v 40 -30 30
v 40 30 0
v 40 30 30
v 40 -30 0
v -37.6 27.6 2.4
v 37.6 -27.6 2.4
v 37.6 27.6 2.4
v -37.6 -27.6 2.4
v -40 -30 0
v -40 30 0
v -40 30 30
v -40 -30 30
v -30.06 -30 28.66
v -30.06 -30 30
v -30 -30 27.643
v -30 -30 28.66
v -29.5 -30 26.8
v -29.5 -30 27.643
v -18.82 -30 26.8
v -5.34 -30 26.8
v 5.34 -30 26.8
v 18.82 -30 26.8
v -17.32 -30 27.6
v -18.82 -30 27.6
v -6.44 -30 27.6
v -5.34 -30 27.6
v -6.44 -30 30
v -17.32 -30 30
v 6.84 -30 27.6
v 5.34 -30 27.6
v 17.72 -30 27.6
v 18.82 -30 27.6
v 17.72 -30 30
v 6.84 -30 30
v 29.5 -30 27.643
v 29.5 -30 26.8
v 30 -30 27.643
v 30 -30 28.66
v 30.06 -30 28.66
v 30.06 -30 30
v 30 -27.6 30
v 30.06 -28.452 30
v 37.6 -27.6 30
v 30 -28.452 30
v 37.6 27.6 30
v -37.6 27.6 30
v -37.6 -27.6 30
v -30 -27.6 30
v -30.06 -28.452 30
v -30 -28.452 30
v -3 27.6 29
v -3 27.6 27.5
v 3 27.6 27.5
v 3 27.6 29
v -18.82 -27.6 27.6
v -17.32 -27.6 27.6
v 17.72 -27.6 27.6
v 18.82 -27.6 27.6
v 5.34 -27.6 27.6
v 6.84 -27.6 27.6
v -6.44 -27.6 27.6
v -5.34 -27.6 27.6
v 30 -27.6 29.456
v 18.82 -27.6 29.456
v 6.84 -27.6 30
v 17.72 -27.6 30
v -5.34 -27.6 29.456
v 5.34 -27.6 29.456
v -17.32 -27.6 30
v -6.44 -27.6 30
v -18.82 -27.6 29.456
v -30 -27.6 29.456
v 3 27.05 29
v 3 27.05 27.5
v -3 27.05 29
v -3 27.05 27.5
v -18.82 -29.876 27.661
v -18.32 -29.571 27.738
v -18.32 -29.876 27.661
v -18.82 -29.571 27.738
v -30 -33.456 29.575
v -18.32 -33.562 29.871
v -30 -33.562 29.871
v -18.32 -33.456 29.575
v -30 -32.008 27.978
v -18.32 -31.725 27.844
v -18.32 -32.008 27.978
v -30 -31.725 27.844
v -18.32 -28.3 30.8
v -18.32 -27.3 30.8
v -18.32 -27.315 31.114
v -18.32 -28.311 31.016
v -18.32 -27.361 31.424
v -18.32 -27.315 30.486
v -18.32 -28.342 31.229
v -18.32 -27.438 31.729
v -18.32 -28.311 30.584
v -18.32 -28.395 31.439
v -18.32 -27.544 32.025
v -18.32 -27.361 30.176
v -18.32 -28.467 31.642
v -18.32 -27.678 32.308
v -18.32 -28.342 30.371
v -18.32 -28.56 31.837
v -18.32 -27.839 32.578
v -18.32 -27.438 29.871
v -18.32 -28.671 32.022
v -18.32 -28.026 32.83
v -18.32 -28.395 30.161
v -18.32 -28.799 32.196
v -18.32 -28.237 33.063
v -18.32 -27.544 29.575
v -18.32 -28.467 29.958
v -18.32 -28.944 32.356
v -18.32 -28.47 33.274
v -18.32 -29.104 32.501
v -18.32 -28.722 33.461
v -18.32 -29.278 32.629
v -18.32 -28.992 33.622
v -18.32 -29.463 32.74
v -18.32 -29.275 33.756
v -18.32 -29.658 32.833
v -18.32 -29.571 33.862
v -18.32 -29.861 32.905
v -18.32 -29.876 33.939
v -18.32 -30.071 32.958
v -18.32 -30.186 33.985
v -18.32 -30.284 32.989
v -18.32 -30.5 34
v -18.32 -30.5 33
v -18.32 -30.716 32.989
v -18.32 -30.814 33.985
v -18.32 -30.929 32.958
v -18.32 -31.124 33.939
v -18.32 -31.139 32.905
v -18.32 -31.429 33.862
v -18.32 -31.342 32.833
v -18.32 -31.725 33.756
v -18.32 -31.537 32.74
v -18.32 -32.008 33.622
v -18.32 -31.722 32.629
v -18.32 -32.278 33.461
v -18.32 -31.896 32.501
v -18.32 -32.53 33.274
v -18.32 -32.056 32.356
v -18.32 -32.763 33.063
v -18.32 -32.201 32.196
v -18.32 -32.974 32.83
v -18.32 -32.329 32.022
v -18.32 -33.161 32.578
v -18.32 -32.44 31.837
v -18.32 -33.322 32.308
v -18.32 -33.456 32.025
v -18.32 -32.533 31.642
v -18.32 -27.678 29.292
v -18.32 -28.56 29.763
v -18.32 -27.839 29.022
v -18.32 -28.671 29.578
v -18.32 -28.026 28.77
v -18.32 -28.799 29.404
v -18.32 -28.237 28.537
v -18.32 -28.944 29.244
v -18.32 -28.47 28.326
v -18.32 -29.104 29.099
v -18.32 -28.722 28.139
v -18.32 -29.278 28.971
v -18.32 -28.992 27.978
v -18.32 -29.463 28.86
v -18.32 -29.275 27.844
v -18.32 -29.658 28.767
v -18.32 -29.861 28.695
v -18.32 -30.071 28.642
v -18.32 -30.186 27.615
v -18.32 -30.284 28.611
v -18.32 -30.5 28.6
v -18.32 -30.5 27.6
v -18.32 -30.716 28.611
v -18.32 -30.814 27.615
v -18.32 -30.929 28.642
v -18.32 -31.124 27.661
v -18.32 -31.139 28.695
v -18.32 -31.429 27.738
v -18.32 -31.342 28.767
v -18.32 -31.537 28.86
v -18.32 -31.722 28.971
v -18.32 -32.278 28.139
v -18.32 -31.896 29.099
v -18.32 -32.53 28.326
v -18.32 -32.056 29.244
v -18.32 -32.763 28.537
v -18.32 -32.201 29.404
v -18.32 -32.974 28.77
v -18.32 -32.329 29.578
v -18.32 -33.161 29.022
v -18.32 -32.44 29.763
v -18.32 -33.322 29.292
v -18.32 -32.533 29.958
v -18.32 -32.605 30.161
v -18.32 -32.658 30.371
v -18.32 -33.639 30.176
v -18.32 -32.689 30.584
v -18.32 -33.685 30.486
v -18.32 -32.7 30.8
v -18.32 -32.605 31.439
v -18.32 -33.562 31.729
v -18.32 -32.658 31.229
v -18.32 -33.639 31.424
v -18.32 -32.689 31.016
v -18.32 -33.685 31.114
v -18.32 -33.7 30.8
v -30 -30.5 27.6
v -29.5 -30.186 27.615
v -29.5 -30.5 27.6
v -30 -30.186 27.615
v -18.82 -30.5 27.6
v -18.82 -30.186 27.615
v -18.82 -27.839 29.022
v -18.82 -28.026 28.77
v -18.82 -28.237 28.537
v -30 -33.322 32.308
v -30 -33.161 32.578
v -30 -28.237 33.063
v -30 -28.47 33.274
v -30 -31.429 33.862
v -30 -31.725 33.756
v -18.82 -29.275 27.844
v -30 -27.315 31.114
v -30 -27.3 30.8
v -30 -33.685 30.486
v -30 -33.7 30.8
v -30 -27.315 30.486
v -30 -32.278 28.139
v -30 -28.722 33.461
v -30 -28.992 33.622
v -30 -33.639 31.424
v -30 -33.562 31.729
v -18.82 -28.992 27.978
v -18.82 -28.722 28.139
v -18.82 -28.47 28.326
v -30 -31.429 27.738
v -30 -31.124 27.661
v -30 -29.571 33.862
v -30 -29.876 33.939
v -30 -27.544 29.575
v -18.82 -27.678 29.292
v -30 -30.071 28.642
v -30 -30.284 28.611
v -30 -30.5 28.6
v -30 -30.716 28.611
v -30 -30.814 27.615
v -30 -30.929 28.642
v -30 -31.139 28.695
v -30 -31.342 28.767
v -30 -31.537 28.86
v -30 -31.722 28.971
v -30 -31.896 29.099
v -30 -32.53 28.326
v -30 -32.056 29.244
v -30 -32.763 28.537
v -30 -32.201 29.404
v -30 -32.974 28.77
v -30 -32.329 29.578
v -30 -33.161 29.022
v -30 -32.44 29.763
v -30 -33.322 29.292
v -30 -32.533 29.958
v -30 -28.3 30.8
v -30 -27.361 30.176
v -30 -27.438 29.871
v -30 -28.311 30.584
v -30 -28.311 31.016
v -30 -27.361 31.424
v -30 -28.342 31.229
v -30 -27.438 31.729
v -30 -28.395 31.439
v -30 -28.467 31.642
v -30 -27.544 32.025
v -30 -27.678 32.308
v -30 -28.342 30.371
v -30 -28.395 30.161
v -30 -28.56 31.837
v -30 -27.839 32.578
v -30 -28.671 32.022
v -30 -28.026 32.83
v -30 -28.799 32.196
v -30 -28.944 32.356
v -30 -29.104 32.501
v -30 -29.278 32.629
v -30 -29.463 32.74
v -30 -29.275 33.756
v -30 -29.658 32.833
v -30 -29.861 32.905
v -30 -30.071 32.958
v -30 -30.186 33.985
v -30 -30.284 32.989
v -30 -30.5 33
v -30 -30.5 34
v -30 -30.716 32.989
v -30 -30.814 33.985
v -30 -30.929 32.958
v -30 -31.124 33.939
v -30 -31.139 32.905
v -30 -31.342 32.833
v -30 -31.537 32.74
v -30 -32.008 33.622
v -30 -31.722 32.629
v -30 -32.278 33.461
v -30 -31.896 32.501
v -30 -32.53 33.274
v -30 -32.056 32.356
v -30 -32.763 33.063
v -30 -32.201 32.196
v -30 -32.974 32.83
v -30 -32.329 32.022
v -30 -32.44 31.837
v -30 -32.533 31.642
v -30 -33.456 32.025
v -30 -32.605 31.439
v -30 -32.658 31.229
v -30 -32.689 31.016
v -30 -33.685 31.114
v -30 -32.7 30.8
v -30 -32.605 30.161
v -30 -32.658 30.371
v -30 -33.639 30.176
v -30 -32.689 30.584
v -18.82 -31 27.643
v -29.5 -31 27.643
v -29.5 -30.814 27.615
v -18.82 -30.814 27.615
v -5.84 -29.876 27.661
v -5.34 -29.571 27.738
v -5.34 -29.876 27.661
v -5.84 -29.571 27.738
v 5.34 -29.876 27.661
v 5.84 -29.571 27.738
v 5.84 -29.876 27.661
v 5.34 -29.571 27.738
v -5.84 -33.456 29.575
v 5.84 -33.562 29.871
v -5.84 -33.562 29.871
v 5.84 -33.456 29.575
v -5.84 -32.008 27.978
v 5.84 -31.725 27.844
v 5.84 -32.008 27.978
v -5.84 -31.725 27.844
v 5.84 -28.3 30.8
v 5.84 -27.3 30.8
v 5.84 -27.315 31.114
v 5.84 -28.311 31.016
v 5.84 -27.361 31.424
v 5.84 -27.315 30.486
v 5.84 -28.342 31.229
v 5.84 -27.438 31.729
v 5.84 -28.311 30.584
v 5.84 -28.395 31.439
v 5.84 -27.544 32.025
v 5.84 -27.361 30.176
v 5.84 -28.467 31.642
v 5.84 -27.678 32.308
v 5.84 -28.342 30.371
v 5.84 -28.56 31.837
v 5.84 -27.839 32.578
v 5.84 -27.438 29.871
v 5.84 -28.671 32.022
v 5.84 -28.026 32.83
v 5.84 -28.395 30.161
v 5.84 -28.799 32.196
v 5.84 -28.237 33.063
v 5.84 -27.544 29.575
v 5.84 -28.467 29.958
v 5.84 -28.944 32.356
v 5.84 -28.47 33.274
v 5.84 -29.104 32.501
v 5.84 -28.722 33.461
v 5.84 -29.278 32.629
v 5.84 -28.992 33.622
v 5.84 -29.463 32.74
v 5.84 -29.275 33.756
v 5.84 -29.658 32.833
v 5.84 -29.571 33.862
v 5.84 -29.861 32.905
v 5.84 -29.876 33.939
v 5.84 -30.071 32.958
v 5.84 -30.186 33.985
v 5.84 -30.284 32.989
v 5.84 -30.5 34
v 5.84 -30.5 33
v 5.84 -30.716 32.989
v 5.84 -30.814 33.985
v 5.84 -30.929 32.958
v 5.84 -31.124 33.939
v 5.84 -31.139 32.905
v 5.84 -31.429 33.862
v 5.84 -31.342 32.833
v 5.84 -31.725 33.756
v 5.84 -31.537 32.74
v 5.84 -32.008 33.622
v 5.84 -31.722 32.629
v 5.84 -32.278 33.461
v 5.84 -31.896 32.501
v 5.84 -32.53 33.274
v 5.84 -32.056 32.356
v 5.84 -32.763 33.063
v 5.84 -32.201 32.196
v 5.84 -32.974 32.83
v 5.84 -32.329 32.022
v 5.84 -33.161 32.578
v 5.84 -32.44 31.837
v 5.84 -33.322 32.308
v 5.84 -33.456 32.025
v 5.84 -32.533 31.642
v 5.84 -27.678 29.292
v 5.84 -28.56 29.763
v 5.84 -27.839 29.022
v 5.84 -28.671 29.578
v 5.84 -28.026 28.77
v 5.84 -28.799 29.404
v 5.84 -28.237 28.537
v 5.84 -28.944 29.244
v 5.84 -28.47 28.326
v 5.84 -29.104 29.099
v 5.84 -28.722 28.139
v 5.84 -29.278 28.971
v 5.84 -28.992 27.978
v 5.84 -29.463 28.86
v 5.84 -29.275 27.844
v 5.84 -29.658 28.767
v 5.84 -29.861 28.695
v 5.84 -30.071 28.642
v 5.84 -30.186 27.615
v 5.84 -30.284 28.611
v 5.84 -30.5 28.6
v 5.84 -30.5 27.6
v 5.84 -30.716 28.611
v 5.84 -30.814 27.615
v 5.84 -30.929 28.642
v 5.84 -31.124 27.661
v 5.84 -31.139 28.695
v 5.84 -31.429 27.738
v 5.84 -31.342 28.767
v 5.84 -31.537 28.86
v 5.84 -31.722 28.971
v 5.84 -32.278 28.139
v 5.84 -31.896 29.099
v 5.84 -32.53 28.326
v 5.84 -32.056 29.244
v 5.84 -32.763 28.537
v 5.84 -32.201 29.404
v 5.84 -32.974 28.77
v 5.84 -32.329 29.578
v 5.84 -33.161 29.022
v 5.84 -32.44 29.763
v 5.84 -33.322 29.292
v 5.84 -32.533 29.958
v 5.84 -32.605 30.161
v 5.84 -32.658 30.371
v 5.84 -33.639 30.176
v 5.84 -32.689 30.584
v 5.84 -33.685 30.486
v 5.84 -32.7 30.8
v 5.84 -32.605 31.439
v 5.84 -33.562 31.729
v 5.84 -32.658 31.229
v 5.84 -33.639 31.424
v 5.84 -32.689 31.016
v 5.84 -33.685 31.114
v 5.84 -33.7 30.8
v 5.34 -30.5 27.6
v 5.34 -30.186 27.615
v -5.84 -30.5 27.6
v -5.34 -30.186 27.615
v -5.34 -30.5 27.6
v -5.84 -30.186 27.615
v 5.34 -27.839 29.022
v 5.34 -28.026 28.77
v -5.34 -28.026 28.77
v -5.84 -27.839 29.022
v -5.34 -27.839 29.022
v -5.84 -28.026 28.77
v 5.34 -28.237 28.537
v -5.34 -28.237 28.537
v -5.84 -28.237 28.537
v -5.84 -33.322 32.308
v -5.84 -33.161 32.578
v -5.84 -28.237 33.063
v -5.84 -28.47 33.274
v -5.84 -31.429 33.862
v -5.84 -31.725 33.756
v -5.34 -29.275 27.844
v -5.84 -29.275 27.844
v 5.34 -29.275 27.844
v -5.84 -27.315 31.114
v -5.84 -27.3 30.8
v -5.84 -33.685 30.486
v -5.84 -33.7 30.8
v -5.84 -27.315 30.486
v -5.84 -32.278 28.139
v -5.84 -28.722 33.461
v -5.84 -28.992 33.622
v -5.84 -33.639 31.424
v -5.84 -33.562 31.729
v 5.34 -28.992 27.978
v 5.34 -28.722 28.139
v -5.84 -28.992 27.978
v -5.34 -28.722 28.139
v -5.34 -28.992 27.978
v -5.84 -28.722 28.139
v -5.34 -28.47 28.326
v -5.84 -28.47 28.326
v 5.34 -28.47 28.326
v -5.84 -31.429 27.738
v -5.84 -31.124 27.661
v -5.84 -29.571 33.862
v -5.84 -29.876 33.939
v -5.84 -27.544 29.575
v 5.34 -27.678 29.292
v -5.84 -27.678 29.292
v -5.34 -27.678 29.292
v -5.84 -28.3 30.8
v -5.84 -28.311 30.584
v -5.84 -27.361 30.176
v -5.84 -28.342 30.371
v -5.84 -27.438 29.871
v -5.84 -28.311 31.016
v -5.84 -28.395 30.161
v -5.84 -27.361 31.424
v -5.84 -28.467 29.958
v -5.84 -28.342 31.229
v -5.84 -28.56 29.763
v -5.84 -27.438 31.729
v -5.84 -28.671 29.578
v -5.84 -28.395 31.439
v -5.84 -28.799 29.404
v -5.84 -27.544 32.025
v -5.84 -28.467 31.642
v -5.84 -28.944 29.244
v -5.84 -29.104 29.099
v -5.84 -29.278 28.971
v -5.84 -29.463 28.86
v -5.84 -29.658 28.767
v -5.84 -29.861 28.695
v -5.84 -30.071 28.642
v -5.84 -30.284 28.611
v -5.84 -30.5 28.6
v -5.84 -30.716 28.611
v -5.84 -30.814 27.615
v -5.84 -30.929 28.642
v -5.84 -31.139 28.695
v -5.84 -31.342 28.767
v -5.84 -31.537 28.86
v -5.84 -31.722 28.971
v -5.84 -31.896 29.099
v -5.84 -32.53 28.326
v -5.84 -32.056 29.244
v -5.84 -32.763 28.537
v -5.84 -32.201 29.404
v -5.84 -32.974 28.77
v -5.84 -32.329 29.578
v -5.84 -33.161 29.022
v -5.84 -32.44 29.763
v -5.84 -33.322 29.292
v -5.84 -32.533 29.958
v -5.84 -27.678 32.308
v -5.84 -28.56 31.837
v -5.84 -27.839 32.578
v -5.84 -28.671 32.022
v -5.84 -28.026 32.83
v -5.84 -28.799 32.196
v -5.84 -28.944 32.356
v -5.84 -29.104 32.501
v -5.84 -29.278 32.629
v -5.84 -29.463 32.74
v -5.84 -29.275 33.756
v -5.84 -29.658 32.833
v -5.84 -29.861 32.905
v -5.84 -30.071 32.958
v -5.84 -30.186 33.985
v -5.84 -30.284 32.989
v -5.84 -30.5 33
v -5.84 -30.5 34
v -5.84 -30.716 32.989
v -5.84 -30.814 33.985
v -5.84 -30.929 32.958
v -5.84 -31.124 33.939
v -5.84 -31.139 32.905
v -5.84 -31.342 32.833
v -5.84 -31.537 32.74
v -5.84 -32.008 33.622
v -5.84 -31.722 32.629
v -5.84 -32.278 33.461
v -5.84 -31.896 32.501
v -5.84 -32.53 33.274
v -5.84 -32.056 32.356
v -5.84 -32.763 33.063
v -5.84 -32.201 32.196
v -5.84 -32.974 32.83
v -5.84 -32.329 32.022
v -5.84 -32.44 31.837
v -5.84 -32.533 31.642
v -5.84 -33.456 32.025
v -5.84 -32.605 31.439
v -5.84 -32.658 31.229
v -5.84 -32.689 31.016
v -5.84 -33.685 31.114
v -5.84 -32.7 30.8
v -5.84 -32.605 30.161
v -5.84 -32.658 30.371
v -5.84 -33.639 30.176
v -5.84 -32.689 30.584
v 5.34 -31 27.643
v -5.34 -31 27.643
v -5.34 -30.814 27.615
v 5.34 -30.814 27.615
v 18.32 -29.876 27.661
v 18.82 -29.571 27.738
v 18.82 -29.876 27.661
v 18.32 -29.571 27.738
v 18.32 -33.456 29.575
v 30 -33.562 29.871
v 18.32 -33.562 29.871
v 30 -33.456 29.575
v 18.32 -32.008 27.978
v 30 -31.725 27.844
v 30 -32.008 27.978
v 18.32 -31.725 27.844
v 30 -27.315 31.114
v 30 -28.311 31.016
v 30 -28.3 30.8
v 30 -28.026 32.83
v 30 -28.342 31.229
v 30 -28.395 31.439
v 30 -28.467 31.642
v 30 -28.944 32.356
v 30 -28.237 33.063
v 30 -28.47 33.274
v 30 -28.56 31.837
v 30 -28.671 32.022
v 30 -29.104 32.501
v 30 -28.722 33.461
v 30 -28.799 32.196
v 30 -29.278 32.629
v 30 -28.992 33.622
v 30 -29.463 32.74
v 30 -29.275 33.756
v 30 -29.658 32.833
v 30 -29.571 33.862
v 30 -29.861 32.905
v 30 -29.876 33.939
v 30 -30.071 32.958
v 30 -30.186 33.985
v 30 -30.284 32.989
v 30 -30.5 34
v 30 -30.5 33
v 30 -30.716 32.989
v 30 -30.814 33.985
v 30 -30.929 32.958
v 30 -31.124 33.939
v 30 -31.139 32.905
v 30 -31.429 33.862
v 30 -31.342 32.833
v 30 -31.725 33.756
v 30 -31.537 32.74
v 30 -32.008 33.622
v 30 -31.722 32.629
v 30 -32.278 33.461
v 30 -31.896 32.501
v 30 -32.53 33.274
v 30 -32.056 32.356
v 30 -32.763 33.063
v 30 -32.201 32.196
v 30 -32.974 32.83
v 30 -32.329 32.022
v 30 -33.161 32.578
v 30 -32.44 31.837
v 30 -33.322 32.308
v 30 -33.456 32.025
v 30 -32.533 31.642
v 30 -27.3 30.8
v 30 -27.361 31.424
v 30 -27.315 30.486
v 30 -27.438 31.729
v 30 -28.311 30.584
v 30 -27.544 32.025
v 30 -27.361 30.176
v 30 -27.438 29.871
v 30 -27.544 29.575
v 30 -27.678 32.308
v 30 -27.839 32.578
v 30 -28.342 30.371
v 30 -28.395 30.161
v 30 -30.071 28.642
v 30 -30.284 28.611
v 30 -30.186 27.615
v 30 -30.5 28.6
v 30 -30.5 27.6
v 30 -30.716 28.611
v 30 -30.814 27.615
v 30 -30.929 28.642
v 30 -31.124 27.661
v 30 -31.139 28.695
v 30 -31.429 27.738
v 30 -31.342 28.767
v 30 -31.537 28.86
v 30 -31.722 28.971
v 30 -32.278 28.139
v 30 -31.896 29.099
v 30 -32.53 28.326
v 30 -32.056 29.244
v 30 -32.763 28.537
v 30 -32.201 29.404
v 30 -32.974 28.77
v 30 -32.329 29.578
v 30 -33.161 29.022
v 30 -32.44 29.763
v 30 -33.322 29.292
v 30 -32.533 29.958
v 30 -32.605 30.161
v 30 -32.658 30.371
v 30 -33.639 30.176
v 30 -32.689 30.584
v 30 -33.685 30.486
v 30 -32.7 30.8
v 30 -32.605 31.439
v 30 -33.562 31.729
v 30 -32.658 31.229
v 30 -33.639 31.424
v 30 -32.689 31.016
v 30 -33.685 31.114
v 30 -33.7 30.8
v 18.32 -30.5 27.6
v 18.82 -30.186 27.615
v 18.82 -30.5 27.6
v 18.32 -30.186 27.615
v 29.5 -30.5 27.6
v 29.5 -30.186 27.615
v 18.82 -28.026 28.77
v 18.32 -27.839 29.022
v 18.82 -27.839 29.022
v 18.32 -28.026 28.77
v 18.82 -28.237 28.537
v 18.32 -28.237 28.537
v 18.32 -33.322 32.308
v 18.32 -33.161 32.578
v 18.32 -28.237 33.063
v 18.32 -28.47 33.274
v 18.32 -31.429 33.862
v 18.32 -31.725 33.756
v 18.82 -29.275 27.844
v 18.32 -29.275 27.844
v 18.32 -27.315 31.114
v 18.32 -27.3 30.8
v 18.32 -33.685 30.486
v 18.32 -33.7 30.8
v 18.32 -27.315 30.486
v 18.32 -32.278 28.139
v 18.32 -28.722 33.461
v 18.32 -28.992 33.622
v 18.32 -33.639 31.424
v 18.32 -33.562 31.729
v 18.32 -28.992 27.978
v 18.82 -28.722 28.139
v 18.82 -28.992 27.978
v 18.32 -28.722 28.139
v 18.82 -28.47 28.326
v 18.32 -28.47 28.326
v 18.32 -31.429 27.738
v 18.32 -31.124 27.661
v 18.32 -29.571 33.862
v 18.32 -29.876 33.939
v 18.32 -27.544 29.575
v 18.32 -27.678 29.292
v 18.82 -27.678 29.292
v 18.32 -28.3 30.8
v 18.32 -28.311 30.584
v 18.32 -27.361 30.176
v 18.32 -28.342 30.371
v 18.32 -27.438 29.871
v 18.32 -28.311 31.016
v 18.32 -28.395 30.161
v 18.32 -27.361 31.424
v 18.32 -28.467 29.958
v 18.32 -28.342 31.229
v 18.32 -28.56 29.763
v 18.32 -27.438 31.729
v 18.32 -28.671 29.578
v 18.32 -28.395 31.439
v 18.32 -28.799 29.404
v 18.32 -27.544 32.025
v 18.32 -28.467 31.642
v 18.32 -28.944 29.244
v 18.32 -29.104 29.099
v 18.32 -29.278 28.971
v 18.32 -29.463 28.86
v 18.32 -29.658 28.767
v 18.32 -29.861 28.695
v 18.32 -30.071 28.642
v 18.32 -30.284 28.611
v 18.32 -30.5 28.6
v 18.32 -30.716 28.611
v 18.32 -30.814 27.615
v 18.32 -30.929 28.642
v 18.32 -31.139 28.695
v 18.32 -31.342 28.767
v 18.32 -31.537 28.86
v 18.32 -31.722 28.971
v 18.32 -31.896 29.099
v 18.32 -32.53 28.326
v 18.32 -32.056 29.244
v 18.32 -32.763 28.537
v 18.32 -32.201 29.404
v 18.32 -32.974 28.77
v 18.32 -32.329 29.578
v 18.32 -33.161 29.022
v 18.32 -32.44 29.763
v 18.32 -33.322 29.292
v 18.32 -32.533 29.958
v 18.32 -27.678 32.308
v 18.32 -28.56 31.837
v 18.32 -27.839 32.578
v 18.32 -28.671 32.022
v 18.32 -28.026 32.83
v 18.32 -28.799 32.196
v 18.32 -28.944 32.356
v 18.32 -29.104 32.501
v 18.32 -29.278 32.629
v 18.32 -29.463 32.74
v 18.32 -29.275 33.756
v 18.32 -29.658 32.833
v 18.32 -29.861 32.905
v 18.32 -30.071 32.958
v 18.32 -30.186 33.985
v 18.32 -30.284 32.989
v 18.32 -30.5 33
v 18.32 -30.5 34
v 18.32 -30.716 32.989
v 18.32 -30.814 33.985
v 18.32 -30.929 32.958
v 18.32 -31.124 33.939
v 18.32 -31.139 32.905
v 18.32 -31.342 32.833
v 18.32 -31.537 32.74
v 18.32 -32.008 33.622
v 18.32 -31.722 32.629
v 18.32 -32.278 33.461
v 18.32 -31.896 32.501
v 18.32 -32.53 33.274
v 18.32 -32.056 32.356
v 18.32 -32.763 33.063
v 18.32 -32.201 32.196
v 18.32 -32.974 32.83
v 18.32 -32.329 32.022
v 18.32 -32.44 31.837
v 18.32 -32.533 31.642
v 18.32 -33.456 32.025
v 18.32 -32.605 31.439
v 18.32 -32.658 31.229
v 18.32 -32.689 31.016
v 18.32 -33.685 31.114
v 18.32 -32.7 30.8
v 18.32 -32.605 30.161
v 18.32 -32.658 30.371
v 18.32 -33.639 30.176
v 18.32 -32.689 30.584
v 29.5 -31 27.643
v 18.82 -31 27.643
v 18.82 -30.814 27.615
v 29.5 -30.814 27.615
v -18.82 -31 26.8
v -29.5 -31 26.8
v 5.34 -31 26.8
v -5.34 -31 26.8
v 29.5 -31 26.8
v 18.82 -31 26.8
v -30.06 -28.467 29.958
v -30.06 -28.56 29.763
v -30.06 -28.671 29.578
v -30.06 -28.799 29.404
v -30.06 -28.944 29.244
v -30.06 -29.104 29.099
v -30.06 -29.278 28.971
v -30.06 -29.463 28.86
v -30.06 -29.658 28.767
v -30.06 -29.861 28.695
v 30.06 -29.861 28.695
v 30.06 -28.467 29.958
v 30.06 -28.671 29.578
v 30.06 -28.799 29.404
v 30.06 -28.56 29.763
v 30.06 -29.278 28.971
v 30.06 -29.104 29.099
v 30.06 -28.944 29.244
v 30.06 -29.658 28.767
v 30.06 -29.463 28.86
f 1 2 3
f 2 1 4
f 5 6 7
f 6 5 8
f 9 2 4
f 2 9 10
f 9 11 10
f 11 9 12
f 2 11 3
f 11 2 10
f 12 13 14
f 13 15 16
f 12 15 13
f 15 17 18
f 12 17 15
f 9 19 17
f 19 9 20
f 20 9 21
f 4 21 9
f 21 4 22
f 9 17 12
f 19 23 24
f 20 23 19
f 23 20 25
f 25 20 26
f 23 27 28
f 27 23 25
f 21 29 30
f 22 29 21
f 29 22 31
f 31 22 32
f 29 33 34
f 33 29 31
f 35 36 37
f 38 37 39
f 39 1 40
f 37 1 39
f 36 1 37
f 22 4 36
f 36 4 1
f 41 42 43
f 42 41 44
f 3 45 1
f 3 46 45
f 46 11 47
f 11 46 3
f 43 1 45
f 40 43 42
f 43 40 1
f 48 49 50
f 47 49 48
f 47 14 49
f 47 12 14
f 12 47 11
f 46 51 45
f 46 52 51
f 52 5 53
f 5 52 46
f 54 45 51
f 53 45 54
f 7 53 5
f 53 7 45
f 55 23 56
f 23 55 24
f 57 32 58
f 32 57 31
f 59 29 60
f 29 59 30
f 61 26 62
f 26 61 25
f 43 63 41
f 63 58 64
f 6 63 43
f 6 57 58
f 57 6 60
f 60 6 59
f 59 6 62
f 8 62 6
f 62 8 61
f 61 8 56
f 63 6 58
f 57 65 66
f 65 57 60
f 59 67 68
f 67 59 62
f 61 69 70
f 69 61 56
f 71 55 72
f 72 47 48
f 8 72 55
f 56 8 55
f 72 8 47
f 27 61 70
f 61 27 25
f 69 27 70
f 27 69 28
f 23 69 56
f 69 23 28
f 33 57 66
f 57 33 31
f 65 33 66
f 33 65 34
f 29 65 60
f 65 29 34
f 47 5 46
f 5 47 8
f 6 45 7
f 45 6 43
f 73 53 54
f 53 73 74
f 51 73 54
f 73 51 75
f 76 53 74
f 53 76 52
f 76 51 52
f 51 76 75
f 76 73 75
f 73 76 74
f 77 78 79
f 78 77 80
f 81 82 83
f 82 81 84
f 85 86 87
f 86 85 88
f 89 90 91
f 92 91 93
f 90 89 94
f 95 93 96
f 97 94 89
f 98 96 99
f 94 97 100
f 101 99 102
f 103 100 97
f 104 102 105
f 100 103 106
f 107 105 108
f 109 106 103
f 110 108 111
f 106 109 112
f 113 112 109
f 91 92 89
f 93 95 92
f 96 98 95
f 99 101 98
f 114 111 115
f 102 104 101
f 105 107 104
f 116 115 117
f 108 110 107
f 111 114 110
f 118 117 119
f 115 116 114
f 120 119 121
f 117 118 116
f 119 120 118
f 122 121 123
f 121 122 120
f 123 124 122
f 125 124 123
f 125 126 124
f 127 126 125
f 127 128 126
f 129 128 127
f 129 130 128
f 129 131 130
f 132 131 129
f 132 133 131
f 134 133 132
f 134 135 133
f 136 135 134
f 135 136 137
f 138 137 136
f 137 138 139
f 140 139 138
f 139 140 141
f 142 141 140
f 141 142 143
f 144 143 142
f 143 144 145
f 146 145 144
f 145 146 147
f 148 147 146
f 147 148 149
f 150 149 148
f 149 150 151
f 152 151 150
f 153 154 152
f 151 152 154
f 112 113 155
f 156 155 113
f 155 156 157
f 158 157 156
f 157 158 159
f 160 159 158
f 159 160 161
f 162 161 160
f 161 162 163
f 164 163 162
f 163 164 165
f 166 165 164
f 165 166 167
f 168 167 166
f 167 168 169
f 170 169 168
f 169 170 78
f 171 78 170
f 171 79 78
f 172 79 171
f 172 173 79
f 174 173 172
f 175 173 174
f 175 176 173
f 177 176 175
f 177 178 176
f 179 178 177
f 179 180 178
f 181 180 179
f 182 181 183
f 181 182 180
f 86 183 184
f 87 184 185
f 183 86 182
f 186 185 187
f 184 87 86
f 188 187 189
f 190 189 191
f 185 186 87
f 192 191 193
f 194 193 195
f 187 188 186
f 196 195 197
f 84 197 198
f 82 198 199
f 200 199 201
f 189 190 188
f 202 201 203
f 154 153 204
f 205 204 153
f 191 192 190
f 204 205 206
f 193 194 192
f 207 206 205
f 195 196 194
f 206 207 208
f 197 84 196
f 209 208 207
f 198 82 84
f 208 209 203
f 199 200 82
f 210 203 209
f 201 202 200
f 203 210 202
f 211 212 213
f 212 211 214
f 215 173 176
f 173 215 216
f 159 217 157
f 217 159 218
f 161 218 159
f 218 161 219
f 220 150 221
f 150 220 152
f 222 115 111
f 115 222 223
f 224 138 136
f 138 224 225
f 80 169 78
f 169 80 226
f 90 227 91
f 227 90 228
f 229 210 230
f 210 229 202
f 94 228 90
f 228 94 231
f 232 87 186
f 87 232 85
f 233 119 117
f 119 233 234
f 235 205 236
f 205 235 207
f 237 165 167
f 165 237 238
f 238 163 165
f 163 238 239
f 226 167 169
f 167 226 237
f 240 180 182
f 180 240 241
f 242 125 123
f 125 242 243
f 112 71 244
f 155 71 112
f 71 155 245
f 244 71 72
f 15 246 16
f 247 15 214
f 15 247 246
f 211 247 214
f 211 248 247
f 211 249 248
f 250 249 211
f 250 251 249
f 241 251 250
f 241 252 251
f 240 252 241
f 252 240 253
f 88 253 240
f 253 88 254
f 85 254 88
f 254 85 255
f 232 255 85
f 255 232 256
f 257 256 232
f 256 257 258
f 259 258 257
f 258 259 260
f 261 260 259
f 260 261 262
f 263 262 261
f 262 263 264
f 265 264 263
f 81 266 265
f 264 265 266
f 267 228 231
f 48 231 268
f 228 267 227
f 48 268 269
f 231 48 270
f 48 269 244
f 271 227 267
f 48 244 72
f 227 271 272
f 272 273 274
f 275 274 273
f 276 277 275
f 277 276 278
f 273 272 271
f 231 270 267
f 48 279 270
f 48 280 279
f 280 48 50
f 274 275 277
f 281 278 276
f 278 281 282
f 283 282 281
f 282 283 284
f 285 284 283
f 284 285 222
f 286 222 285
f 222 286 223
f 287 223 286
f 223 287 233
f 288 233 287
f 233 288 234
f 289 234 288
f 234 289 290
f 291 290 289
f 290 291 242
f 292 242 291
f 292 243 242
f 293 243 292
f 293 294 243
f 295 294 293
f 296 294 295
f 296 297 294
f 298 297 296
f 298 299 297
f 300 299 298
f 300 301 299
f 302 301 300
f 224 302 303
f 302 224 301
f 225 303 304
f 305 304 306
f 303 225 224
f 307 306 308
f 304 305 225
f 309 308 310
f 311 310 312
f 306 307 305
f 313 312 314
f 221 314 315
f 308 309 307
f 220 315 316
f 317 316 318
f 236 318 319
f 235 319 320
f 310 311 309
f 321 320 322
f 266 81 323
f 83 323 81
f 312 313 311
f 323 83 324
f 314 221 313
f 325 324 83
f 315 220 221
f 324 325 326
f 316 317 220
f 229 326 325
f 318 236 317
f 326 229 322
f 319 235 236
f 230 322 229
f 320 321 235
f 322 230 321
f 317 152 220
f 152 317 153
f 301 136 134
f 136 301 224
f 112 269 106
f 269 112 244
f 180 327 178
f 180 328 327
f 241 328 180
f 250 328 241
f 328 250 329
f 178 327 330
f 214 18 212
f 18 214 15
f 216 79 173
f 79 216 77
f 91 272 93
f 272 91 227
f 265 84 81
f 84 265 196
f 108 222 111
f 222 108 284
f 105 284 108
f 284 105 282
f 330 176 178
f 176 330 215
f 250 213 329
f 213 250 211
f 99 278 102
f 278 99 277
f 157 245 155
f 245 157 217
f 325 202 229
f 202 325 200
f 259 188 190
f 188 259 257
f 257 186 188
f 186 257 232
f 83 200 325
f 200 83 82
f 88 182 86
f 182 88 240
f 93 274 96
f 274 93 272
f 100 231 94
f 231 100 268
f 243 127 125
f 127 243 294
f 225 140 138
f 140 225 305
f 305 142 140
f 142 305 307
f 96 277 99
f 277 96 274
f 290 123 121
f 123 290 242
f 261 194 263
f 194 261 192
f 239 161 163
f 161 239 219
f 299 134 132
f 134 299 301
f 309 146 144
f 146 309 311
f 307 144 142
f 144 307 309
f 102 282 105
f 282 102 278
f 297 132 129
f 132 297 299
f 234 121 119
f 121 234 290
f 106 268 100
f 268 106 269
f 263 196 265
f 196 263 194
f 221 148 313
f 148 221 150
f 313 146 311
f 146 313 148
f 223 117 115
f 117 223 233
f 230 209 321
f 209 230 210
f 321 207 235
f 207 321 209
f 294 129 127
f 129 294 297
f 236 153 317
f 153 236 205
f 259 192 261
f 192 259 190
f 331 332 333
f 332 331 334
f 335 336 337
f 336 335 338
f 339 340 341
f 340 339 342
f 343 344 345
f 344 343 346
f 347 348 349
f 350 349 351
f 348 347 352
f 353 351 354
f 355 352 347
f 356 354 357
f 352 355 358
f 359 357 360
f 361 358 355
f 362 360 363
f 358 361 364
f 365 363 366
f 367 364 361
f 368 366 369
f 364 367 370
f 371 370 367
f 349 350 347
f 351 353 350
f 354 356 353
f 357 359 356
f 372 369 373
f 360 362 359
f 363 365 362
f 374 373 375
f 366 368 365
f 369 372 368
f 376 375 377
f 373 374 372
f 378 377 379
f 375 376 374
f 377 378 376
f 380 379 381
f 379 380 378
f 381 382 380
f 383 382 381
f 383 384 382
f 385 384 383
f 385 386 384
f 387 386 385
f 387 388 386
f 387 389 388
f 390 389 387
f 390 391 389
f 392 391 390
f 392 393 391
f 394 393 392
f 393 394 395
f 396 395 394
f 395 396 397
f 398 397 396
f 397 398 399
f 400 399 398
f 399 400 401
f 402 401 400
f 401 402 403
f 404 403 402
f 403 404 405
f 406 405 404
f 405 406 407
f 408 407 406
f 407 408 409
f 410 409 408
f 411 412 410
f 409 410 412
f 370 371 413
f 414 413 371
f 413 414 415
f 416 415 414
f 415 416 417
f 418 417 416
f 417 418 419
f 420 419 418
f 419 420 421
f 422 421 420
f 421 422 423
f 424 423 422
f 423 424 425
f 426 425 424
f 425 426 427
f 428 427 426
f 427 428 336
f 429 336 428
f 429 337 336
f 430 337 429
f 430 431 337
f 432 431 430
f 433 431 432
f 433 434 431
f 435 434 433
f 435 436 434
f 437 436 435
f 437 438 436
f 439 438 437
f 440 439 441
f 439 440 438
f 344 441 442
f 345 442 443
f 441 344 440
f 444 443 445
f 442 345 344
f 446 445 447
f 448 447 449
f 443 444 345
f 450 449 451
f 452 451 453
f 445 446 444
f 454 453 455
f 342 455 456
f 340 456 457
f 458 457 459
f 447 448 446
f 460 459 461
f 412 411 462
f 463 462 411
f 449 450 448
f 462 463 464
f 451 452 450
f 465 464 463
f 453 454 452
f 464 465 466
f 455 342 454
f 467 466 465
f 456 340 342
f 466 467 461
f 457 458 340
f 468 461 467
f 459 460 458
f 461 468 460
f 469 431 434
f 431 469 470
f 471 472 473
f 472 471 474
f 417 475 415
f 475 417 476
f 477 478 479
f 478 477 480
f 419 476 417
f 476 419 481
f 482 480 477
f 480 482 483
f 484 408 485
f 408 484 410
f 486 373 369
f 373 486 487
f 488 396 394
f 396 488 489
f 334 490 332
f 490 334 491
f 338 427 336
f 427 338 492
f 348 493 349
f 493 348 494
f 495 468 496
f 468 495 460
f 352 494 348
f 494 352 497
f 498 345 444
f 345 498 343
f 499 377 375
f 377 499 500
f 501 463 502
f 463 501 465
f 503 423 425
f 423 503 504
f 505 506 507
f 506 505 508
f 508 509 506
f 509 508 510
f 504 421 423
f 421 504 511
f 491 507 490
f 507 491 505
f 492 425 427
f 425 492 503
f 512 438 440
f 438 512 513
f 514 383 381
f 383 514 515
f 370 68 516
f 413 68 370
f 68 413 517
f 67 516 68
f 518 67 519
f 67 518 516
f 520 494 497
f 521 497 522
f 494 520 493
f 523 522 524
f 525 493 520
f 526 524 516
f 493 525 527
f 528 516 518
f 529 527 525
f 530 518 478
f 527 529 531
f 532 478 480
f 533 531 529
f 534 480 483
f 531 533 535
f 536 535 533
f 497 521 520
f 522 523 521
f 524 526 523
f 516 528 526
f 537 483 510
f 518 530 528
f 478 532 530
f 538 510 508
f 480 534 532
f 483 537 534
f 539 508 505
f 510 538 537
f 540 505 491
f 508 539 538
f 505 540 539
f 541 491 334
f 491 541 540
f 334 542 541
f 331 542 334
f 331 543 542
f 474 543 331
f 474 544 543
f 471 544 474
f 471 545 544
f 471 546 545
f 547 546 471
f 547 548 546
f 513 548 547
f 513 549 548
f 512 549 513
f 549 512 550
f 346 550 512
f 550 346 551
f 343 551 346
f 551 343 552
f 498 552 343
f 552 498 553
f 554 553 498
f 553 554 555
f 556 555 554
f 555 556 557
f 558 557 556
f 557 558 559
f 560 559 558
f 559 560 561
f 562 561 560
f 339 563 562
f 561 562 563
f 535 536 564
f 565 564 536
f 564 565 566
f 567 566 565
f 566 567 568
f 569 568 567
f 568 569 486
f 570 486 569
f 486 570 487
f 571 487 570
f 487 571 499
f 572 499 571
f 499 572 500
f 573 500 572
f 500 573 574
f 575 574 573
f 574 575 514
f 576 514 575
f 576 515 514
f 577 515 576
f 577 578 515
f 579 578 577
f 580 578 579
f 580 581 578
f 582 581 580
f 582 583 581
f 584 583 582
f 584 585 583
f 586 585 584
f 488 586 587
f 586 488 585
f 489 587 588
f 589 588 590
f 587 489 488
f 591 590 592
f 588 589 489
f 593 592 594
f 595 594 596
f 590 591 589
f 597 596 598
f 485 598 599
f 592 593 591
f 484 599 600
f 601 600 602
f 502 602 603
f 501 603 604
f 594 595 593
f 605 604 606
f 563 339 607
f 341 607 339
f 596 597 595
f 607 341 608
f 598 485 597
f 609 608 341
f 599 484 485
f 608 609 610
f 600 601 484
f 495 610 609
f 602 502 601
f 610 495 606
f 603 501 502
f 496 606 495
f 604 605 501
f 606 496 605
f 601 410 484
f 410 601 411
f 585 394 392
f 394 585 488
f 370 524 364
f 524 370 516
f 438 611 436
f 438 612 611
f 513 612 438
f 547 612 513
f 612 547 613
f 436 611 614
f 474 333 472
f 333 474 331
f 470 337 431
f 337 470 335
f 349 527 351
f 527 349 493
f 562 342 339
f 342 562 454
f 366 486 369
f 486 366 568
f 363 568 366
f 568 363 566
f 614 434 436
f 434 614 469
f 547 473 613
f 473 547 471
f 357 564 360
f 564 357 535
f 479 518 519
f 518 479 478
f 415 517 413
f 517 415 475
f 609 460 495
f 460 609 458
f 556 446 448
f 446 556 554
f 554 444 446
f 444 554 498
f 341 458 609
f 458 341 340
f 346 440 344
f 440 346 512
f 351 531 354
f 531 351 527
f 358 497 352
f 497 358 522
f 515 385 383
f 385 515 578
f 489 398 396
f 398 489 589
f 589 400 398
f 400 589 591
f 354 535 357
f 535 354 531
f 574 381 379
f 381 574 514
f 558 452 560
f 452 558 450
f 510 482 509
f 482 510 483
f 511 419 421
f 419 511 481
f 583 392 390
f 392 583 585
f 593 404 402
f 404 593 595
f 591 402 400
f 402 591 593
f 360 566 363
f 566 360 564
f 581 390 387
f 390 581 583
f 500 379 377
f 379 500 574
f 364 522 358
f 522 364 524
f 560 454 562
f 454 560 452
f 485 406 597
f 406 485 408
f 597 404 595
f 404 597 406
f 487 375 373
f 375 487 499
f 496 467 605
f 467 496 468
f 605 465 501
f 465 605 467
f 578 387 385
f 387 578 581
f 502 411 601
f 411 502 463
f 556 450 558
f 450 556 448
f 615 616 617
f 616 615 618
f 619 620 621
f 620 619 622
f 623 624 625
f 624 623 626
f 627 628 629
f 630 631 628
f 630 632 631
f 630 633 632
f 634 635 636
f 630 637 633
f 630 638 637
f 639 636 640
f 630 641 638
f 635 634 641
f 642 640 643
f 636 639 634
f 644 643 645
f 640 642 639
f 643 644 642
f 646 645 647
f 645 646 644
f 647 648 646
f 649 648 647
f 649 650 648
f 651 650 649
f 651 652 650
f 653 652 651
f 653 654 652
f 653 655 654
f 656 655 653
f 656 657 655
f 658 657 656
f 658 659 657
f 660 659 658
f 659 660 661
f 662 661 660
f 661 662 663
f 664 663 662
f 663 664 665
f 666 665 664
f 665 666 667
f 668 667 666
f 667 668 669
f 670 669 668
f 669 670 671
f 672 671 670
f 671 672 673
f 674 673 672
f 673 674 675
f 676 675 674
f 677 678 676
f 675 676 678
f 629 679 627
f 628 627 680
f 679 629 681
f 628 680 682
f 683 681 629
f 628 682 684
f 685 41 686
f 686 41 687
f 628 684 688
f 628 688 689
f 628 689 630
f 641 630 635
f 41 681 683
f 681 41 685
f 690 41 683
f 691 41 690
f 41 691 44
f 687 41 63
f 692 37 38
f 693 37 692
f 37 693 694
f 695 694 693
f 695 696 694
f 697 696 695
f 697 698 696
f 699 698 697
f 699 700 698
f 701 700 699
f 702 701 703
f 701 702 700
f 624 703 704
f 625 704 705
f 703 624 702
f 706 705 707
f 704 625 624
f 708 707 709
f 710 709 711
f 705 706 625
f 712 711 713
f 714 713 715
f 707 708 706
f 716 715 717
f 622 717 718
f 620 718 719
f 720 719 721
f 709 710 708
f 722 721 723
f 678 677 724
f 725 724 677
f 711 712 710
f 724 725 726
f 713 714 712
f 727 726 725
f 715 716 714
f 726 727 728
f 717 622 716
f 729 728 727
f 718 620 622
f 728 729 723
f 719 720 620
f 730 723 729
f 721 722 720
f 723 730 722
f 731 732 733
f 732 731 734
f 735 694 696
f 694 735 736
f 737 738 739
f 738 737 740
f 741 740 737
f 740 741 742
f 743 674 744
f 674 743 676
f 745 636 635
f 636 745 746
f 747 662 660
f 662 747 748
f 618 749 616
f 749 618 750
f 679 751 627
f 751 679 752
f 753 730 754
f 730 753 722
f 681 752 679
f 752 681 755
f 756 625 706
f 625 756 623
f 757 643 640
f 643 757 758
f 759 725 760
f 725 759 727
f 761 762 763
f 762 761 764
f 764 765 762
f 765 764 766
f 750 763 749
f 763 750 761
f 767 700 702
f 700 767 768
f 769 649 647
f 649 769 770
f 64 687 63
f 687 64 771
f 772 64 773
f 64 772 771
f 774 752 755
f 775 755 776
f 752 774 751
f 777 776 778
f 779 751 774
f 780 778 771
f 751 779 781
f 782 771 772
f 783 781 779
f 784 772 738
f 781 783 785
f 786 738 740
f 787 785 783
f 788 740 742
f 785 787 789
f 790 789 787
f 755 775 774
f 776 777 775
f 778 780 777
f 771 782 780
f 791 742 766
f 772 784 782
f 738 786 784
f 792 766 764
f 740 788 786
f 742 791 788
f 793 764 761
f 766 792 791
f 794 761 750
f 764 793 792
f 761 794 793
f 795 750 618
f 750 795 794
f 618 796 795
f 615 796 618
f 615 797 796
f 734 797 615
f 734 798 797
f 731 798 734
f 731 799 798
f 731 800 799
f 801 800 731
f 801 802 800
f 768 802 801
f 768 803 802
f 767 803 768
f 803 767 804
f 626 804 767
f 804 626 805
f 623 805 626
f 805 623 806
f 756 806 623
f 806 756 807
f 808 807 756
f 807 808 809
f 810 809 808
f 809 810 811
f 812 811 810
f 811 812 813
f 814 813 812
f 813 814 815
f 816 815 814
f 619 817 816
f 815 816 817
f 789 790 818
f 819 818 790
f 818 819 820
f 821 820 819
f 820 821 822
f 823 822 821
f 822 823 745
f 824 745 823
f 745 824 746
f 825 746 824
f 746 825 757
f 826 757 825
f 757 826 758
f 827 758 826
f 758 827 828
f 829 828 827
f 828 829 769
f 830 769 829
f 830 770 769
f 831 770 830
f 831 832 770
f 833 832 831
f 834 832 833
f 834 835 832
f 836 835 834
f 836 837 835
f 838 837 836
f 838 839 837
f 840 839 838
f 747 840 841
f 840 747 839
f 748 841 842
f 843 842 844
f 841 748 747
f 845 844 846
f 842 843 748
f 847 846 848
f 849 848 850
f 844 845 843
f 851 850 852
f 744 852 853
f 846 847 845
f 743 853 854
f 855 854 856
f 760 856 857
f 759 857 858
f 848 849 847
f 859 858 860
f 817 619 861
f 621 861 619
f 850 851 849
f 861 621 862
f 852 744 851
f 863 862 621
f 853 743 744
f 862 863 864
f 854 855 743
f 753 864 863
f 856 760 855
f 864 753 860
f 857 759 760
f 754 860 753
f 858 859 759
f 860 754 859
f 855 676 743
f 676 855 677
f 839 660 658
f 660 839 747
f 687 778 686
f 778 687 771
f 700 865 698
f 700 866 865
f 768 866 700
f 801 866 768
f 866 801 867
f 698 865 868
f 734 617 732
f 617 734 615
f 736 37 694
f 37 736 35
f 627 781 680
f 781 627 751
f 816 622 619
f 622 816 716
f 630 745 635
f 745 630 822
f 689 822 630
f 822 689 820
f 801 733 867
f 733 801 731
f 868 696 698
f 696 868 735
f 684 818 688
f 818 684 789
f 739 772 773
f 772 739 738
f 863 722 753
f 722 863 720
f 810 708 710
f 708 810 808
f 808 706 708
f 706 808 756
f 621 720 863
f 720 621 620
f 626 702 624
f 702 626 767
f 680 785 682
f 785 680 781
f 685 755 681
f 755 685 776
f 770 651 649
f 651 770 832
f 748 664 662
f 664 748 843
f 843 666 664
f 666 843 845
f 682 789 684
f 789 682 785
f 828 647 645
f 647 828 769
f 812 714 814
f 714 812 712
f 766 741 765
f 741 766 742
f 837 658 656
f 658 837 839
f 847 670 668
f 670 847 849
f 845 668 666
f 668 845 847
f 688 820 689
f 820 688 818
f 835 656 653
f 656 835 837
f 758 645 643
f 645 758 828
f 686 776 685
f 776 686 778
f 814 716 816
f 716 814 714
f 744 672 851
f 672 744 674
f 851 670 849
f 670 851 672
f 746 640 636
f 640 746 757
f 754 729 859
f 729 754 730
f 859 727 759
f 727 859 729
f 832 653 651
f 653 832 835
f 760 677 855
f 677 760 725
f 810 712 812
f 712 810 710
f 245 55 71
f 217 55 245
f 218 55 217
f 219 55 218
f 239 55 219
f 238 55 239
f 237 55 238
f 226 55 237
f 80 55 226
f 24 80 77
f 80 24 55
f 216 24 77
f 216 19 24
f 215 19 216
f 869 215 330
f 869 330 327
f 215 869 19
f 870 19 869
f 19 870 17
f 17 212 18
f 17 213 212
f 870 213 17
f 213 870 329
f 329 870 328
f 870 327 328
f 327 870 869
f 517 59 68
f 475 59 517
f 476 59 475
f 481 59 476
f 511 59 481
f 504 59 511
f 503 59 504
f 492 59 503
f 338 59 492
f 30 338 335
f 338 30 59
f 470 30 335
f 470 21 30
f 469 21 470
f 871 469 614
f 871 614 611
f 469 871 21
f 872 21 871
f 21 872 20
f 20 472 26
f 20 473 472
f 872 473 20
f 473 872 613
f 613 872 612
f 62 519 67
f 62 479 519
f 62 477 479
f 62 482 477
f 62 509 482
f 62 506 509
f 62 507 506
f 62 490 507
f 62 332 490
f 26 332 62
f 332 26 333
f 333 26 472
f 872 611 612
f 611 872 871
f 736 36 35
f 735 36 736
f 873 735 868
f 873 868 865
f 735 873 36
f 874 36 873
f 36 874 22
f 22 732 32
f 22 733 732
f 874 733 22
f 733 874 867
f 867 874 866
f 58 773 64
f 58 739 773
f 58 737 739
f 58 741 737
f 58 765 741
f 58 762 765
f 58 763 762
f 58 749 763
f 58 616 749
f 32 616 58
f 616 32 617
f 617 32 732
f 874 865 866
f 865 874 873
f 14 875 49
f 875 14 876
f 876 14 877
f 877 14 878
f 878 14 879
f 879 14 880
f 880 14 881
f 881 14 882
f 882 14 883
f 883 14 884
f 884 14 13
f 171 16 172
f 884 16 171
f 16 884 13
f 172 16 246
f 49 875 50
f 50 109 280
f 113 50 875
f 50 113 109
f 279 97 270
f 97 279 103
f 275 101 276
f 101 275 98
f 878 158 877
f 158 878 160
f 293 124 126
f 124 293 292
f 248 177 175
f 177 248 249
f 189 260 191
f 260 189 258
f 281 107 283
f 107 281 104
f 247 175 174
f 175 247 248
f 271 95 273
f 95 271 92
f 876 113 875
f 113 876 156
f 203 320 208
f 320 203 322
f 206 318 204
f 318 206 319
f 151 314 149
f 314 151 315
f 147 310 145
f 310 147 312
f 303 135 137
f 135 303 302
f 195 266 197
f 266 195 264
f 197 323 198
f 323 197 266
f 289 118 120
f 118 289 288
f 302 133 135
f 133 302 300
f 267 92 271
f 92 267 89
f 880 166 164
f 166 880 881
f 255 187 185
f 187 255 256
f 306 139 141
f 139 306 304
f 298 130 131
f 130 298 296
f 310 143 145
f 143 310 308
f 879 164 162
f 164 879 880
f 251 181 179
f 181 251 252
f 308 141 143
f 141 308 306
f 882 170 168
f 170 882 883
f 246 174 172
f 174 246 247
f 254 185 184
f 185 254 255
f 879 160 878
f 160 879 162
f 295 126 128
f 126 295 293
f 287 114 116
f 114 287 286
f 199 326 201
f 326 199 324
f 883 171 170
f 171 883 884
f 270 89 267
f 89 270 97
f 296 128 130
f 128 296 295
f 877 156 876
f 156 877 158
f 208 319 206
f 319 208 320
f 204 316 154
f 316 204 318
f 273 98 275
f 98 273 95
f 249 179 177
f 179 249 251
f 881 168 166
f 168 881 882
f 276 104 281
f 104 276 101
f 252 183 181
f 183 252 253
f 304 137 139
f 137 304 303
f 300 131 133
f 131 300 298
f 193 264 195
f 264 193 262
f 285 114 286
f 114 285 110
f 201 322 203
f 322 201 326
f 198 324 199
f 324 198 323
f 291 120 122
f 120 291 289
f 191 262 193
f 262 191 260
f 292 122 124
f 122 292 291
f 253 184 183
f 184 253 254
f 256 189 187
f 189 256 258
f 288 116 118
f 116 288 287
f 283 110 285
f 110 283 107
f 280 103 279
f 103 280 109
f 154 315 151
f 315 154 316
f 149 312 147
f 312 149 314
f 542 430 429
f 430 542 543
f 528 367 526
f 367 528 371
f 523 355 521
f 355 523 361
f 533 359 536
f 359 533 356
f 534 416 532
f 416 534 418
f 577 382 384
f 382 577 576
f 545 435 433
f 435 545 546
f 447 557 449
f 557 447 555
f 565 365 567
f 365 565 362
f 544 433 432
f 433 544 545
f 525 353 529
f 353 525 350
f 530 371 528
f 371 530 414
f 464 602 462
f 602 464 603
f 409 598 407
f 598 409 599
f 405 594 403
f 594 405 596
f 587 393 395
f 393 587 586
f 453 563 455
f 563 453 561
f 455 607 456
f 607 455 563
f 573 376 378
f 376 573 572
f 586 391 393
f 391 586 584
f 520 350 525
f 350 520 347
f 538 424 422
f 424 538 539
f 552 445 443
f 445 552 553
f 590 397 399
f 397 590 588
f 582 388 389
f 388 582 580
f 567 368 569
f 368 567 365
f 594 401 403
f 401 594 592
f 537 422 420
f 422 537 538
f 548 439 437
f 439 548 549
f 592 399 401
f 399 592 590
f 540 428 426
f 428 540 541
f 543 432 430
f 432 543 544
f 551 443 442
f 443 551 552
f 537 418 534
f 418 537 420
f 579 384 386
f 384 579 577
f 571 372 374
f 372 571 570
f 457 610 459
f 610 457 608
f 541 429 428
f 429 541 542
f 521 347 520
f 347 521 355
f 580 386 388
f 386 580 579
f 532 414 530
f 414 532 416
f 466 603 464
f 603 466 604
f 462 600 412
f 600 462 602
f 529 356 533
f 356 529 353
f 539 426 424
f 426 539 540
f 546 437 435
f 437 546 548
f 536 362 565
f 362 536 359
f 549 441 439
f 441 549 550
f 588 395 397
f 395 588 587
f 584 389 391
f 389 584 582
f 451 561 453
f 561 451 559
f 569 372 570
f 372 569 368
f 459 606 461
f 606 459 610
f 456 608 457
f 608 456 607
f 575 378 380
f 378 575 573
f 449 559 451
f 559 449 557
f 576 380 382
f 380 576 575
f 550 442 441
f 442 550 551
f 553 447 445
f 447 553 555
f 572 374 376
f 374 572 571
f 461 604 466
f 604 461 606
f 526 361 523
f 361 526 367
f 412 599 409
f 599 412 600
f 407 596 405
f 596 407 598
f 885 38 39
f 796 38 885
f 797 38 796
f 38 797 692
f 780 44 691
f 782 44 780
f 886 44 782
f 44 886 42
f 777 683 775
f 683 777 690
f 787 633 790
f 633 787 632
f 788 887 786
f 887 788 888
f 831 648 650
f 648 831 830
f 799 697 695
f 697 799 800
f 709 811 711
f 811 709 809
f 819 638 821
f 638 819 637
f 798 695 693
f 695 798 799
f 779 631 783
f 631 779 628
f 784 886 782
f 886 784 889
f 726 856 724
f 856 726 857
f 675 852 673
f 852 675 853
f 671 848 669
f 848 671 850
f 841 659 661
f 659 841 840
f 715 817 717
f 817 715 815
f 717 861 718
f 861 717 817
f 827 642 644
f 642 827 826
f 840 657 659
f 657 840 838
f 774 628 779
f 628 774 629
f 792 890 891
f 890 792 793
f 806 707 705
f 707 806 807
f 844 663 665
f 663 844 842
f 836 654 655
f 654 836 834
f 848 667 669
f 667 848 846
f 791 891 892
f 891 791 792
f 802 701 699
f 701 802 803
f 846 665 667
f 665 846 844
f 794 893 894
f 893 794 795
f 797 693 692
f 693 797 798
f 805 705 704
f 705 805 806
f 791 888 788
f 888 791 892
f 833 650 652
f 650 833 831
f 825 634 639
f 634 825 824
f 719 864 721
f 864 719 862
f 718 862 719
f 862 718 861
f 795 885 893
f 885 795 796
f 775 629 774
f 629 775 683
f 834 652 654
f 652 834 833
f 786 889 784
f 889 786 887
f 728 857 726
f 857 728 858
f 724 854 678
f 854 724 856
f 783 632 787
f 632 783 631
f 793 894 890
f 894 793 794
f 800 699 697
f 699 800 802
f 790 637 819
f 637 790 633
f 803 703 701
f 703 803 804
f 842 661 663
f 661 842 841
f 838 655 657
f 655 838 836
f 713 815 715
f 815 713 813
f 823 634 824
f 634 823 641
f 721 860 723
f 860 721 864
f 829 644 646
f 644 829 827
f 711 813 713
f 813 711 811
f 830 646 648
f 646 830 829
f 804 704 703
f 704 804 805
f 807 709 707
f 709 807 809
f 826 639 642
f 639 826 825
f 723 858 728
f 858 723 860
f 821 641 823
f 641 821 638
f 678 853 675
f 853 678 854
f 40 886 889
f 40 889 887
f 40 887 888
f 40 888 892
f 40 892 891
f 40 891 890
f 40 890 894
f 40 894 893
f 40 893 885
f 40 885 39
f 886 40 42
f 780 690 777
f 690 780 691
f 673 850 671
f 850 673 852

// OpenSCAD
// Box with print-in-place hinge (v4: bridge webs to kill band overhangs)
part = "box"; // [box, lid, pin, assembly]
cadverify_only = "";
module instance(name, part, unit = 1) {
    echo(cadverify_instance = [name, part, unit]);
    if (cadverify_only == "" || cadverify_only == name) children();
}

Rkn = 3.2; rbore = 2.2; rpin = 1.9;
yh = -30.5; zh = 30.8;
lid_zh = 3.4;
lid_lift = 27.4;
pin_lift_z = 27.8; pin_shift_y = -30.5;
k0x0=-30; k0x1=-18.32;
k1x0=-17.92; k1x1=-6.24;
k2x0=-5.84; k2x1=5.84;
k3x0=6.24; k3x1=17.92;
k4x0=18.32; k4x1=30;

$fn = 64;

module xcyl(x0, x1, r, y, z) {
    translate([x0, y, z]) rotate([0, 90, 0]) cylinder(r = r, h = x1 - x0);
}

module box_part() {
    difference() {
        union() {
            translate([-40, -30, 0]) cube([80, 60, 2.4]);
            translate([-40, 27.6, 2.4]) cube([80, 2.4, 27.6]);
            translate([-40, -30, 2.4]) cube([80, 2.4, 27.6 - 2.4]);
            // top band of back wall split into segs clearing lid knuckles axially (0.6 gap each side)
            translate([-40, -30, 27.0]) cube([11.48, 2.4, 3.0]);
            translate([-17.32, -30, 27.0]) cube([10.88, 2.4, 3.0]);
            translate([6.84, -30, 27.0]) cube([10.88, 2.4, 3.0]);
            translate([28.52, -30, 27.0]) cube([11.48, 2.4, 3.0]);
            translate([-40, -27.6, 2.4]) cube([2.4, 55.2, 27.6]);
            translate([37.6, -27.6, 2.4]) cube([2.4, 55.2, 27.6]);
            translate([-3, 27.05, 27.5]) cube([6, 0.6, 1.5]);
            // hinge knuckles + support webs tying them to the back wall
            xcyl(k0x0, k0x1, Rkn, yh, zh);
            xcyl(k2x0, k2x1, Rkn, yh, zh);
            xcyl(k4x0, k4x1, Rkn, yh, zh);
            translate([k0x0 + 0.5, -31, 26.8]) cube([k0x1-k0x0 - 1.0, 3.4, 4.0]);
            translate([k2x0 + 0.5, -31, 26.8]) cube([k2x1-k2x0 - 1.0, 3.4, 4.0]);
            translate([k4x0 + 0.5, -31, 26.8]) cube([k4x1-k4x0 - 1.0, 3.4, 4.0]);
        }
        xcyl(k0x0-0.06, k0x1+0.06, rbore, yh, zh);
        xcyl(k2x0-0.06, k2x1+0.06, rbore, yh, zh);
        xcyl(k4x0-0.06, k4x1+0.06, rbore, yh, zh);
    }
}

module lid_part() {
    difference() {
        union() {
            translate([-40, -30, 10.6]) cube([80, 60, 2.4]);
            translate([-40, 27.6, 3]) cube([80, 2.4, 7.6]);
            translate([-17.92, -30, 3]) cube([11.68, 2.4, 7.6]);
            translate([6.24, -30, 3]) cube([11.68, 2.4, 7.6]);
            translate([-40, -30, 3]) cube([9.2, 2.4, 7.6]);
            translate([-5.24, -30, 3]) cube([10.48, 2.4, 7.6]);
            translate([18.92, -30, 3]) cube([10.48, 2.4, 7.6]);
            translate([30.8, -30, 3]) cube([9.2, 2.4, 7.6]);
            translate([-40, -27.6, 3]) cube([2.4, 55.2, 7.6]);
            translate([37.6, -27.6, 3]) cube([2.4, 55.2, 7.6]);
            translate([-37.2, 25.2, 0]) cube([74.4, 2.0, 10.6]);
            translate([-37.2, -27.2, 0]) cube([74.4, 2.0, 10.6]);
            translate([-37.2, -25.2, 0]) cube([2.0, 50.4, 10.6]);
            translate([35.2, -25.2, 0]) cube([2.0, 50.4, 10.6]);
            xcyl(k1x0, k1x1, Rkn, yh, lid_zh);
            xcyl(k3x0, k3x1, Rkn, yh, lid_zh);
            translate([k1x0 + 0.5, -31, 0]) cube([k1x1-k1x0 - 1.0, 3.4, 5]);
            translate([k3x0 + 0.5, -31, 0]) cube([k3x1-k3x0 - 1.0, 3.4, 5]);
        }
        xcyl(k1x0-0.06, k1x1+0.06, rbore, yh, lid_zh);
        xcyl(k3x0-0.06, k3x1+0.06, rbore, yh, lid_zh);
        translate([-3.35, 26.4, -0.05]) cube([6.7, 1.55, 2.05]);
    }
}

module pin_part() {
    union() {
        xcyl(-32.4, 32.4, 1.8, 0, 3);
        xcyl(-32.4, 32.4, 2.8, 0, 0.2);
        xcyl(31.4, 32.4, 2.8, 0, 3);
        xcyl(-32.4, -31.4, 2.8, 0, 3);
    }
}

if (part == "box") {
    echo(cadverify_spec = [
        ["bounds", [[-40, -33.7, 0], [40, 30, 34.0]]],
        ["bodies", 1],
        ["through_holes", 3],
        ["support_faces", [["bed", "-z", 4000]]],
        ["overhangs_allowed", [["hinge knuckles, bores and wall cutouts print in place", [[-30.2, -33.9, 26.5], [30.2, -27.1, 33.5]]], ["catch bump underside, tiny 3.6 mm2 ledge", [[-3.2, 26.8, 27.3], [3.2, 27.8, 27.7]]]]],
        ["copies", 1],
        ["details", [
            ["floor", "thickness", [0, 0, -1], [0, 0, 1], 2.4],
            ["front_wall", "thickness", [0, 31, 15], [0, -1, 0], 2.4],
            ["cavity", "void", [[-37.6, -27.6, 2.4], [37.6, 27.6, 29.9]], 0.9],
            ["hinge_bore", "hole", [-31, -30.5, 30.8], [1, 0, 0], [[0, 4.4], [11.6, 4.4]]],
            ["catch_bump", "material", [[-3, 27.05, 27.5], [3, 27.6, 29.0]], 0.9],
            ["hinge_view", "view", [[-30, -34, 26.5], [30, -27, 34.5]]]
        ]]
    ]);
    box_part();
} else if (part == "lid") {
    echo(cadverify_spec = [
        ["bounds", [[-40, -33.7, 0], [40, 30, 13]]],
        ["bodies", 1],
        ["through_holes", 2],
        ["support_faces", [["bed", "-z", 300]]],
        ["overhangs_allowed", [
            ["hinge knuckles and bores print in place", [[-18.2, -33.9, 0], [18.2, -27.1, 4.2]]],
            ["lid top bridging over plug cavity", [[-37.2, -24.9, 10.1], [37.2, 25.2, 11.1]]],
            ["lid skirt bottom band, flat 0.4-gap bridge when assembled", [[-40.2, -30.2, 2.8], [40.2, 30.2, 3.2]]],
            ["lid skirt inner ledge over box rim, flat bridge", [[-37.8, -30.2, 10.4], [37.8, 27.8, 10.8]]],
            ["hinge knuckle underside rounds, 0.4-gap print bridge", [[-18.2, -33.9, 3.0], [18.2, -27.1, 6.6]]],
            ["lid back skirt gaps between knuckles, flat bridge", [[-30.6, -30.2, 2.8], [30.6, -27.4, 3.4]]],
            ["notch top face over notch void, tiny bridge", [[-3.5, 26.3, 1.8], [3.5, 28.0, 2.2]]]
        ]],
        ["copies", 1],
        ["details", [
            ["top", "thickness", [0, 0, 14], [0, 0, -1], 2.4],
            ["skirt", "thickness", [0, 31, 6], [0, -1, 0], 2.4],
            ["plug_cavity", "void", [[-35.2, -24.9, 0], [35.2, 25.2, 10.5]], 0.9],
            ["hinge_bore", "hole", [-18.6, -30.5, 3.4], [1, 0, 0], [[0, 4.4], [11.6, 4.4]]],
            ["catch_notch", "void", [[-3.35, 26.4, 0], [3.35, 27.95, 2.0]], 0.9],
            ["catch_view", "view", [[-5, 26.3, 0], [5, 28.5, 3]]]
        ]]
    ]);
    lid_part();
} else if (part == "pin") {
    echo(cadverify_spec = [
        ["bounds", [[-32.4, -3, 0], [32.4, 3, 6]]],
        ["bodies", 1],
        ["support_faces", []],
        ["overhangs_allowed", [["pin shaft underside bridges with 0.3 gap", [[-32.4, -1.9, 0], [32.4, 1.9, 1.6]]]]],
        ["copies", 1],
        ["details", [
            ["shaft", "thickness", [0, 3, 3], [0, -1, 0], 3.6],
            ["head", "material", [[31.4, -2.8, 0], [32.4, 2.8, 6]], 0.7],
            ["pin_view", "view", [[-32.4, -3, 0], [32.4, 3, 6]]]
        ]]
    ]);
    pin_part();
} else if (part == "assembly") {
    echo(cadverify_spec = [
        ["bounds", [[-40, -33.7, 0], [40, 30, 40.4]]],
        ["support_faces", [["bed", "-z", 4000]]],
        ["allowed_interferences", []],
        ["motions", [
            ["lid_open", ["lid"], "rotate", [0, -30.5, 30.8], [1, 0, 0], [0, 110], ["flex", [["lid", "box", 0.5, "catch bump clearance pass"]]]]
        ]],
        ["assembly_order", [
            [["box"], [0, 0, 0]],
            [["lid"], [0, 0, -1]],
            [["pin"], [1, 0, 0]]
        ]],
        ["print_in_place", 0.3],
        ["overhangs_allowed", [
            ["hinge undersides, pin bridge and cutouts in place", [[-33, -34, 26.5], [33, -27, 34.8]]],
            ["lid top bridging over box cavity", [[-37.2, -24.9, 37.5], [37.2, 25.2, 38.5]]],
            ["front lid skirt band over box rim, 0.4 gap flat bridge", [[-40.2, -30.2, 30.2], [40.2, 30.2, 30.6]]],
            ["lid plug bottom face over print gap, flat bridge", [[-37.4, -27.4, 27.2], [37.4, 27.4, 27.6]]],
            ["lid skirt inner ledge over box rim, flat bridge", [[-37.8, -30.2, 37.8], [37.8, 27.8, 38.2]]],
            ["notch top face over notch void, tiny bridge", [[-3.5, 26.3, 29.2], [3.5, 28.0, 29.6]]],
            ["catch bump underside, tiny 3.6 mm2 ledge", [[-3.2, 26.9, 27.3], [3.2, 27.8, 27.7]]]
        ]]
    ]);
    instance("box", "box") box_part();
    instance("lid", "lid") translate([0, 0, lid_lift]) lid_part();
    instance("pin", "pin") translate([0, pin_shift_y, pin_lift_z]) pin_part();
}
